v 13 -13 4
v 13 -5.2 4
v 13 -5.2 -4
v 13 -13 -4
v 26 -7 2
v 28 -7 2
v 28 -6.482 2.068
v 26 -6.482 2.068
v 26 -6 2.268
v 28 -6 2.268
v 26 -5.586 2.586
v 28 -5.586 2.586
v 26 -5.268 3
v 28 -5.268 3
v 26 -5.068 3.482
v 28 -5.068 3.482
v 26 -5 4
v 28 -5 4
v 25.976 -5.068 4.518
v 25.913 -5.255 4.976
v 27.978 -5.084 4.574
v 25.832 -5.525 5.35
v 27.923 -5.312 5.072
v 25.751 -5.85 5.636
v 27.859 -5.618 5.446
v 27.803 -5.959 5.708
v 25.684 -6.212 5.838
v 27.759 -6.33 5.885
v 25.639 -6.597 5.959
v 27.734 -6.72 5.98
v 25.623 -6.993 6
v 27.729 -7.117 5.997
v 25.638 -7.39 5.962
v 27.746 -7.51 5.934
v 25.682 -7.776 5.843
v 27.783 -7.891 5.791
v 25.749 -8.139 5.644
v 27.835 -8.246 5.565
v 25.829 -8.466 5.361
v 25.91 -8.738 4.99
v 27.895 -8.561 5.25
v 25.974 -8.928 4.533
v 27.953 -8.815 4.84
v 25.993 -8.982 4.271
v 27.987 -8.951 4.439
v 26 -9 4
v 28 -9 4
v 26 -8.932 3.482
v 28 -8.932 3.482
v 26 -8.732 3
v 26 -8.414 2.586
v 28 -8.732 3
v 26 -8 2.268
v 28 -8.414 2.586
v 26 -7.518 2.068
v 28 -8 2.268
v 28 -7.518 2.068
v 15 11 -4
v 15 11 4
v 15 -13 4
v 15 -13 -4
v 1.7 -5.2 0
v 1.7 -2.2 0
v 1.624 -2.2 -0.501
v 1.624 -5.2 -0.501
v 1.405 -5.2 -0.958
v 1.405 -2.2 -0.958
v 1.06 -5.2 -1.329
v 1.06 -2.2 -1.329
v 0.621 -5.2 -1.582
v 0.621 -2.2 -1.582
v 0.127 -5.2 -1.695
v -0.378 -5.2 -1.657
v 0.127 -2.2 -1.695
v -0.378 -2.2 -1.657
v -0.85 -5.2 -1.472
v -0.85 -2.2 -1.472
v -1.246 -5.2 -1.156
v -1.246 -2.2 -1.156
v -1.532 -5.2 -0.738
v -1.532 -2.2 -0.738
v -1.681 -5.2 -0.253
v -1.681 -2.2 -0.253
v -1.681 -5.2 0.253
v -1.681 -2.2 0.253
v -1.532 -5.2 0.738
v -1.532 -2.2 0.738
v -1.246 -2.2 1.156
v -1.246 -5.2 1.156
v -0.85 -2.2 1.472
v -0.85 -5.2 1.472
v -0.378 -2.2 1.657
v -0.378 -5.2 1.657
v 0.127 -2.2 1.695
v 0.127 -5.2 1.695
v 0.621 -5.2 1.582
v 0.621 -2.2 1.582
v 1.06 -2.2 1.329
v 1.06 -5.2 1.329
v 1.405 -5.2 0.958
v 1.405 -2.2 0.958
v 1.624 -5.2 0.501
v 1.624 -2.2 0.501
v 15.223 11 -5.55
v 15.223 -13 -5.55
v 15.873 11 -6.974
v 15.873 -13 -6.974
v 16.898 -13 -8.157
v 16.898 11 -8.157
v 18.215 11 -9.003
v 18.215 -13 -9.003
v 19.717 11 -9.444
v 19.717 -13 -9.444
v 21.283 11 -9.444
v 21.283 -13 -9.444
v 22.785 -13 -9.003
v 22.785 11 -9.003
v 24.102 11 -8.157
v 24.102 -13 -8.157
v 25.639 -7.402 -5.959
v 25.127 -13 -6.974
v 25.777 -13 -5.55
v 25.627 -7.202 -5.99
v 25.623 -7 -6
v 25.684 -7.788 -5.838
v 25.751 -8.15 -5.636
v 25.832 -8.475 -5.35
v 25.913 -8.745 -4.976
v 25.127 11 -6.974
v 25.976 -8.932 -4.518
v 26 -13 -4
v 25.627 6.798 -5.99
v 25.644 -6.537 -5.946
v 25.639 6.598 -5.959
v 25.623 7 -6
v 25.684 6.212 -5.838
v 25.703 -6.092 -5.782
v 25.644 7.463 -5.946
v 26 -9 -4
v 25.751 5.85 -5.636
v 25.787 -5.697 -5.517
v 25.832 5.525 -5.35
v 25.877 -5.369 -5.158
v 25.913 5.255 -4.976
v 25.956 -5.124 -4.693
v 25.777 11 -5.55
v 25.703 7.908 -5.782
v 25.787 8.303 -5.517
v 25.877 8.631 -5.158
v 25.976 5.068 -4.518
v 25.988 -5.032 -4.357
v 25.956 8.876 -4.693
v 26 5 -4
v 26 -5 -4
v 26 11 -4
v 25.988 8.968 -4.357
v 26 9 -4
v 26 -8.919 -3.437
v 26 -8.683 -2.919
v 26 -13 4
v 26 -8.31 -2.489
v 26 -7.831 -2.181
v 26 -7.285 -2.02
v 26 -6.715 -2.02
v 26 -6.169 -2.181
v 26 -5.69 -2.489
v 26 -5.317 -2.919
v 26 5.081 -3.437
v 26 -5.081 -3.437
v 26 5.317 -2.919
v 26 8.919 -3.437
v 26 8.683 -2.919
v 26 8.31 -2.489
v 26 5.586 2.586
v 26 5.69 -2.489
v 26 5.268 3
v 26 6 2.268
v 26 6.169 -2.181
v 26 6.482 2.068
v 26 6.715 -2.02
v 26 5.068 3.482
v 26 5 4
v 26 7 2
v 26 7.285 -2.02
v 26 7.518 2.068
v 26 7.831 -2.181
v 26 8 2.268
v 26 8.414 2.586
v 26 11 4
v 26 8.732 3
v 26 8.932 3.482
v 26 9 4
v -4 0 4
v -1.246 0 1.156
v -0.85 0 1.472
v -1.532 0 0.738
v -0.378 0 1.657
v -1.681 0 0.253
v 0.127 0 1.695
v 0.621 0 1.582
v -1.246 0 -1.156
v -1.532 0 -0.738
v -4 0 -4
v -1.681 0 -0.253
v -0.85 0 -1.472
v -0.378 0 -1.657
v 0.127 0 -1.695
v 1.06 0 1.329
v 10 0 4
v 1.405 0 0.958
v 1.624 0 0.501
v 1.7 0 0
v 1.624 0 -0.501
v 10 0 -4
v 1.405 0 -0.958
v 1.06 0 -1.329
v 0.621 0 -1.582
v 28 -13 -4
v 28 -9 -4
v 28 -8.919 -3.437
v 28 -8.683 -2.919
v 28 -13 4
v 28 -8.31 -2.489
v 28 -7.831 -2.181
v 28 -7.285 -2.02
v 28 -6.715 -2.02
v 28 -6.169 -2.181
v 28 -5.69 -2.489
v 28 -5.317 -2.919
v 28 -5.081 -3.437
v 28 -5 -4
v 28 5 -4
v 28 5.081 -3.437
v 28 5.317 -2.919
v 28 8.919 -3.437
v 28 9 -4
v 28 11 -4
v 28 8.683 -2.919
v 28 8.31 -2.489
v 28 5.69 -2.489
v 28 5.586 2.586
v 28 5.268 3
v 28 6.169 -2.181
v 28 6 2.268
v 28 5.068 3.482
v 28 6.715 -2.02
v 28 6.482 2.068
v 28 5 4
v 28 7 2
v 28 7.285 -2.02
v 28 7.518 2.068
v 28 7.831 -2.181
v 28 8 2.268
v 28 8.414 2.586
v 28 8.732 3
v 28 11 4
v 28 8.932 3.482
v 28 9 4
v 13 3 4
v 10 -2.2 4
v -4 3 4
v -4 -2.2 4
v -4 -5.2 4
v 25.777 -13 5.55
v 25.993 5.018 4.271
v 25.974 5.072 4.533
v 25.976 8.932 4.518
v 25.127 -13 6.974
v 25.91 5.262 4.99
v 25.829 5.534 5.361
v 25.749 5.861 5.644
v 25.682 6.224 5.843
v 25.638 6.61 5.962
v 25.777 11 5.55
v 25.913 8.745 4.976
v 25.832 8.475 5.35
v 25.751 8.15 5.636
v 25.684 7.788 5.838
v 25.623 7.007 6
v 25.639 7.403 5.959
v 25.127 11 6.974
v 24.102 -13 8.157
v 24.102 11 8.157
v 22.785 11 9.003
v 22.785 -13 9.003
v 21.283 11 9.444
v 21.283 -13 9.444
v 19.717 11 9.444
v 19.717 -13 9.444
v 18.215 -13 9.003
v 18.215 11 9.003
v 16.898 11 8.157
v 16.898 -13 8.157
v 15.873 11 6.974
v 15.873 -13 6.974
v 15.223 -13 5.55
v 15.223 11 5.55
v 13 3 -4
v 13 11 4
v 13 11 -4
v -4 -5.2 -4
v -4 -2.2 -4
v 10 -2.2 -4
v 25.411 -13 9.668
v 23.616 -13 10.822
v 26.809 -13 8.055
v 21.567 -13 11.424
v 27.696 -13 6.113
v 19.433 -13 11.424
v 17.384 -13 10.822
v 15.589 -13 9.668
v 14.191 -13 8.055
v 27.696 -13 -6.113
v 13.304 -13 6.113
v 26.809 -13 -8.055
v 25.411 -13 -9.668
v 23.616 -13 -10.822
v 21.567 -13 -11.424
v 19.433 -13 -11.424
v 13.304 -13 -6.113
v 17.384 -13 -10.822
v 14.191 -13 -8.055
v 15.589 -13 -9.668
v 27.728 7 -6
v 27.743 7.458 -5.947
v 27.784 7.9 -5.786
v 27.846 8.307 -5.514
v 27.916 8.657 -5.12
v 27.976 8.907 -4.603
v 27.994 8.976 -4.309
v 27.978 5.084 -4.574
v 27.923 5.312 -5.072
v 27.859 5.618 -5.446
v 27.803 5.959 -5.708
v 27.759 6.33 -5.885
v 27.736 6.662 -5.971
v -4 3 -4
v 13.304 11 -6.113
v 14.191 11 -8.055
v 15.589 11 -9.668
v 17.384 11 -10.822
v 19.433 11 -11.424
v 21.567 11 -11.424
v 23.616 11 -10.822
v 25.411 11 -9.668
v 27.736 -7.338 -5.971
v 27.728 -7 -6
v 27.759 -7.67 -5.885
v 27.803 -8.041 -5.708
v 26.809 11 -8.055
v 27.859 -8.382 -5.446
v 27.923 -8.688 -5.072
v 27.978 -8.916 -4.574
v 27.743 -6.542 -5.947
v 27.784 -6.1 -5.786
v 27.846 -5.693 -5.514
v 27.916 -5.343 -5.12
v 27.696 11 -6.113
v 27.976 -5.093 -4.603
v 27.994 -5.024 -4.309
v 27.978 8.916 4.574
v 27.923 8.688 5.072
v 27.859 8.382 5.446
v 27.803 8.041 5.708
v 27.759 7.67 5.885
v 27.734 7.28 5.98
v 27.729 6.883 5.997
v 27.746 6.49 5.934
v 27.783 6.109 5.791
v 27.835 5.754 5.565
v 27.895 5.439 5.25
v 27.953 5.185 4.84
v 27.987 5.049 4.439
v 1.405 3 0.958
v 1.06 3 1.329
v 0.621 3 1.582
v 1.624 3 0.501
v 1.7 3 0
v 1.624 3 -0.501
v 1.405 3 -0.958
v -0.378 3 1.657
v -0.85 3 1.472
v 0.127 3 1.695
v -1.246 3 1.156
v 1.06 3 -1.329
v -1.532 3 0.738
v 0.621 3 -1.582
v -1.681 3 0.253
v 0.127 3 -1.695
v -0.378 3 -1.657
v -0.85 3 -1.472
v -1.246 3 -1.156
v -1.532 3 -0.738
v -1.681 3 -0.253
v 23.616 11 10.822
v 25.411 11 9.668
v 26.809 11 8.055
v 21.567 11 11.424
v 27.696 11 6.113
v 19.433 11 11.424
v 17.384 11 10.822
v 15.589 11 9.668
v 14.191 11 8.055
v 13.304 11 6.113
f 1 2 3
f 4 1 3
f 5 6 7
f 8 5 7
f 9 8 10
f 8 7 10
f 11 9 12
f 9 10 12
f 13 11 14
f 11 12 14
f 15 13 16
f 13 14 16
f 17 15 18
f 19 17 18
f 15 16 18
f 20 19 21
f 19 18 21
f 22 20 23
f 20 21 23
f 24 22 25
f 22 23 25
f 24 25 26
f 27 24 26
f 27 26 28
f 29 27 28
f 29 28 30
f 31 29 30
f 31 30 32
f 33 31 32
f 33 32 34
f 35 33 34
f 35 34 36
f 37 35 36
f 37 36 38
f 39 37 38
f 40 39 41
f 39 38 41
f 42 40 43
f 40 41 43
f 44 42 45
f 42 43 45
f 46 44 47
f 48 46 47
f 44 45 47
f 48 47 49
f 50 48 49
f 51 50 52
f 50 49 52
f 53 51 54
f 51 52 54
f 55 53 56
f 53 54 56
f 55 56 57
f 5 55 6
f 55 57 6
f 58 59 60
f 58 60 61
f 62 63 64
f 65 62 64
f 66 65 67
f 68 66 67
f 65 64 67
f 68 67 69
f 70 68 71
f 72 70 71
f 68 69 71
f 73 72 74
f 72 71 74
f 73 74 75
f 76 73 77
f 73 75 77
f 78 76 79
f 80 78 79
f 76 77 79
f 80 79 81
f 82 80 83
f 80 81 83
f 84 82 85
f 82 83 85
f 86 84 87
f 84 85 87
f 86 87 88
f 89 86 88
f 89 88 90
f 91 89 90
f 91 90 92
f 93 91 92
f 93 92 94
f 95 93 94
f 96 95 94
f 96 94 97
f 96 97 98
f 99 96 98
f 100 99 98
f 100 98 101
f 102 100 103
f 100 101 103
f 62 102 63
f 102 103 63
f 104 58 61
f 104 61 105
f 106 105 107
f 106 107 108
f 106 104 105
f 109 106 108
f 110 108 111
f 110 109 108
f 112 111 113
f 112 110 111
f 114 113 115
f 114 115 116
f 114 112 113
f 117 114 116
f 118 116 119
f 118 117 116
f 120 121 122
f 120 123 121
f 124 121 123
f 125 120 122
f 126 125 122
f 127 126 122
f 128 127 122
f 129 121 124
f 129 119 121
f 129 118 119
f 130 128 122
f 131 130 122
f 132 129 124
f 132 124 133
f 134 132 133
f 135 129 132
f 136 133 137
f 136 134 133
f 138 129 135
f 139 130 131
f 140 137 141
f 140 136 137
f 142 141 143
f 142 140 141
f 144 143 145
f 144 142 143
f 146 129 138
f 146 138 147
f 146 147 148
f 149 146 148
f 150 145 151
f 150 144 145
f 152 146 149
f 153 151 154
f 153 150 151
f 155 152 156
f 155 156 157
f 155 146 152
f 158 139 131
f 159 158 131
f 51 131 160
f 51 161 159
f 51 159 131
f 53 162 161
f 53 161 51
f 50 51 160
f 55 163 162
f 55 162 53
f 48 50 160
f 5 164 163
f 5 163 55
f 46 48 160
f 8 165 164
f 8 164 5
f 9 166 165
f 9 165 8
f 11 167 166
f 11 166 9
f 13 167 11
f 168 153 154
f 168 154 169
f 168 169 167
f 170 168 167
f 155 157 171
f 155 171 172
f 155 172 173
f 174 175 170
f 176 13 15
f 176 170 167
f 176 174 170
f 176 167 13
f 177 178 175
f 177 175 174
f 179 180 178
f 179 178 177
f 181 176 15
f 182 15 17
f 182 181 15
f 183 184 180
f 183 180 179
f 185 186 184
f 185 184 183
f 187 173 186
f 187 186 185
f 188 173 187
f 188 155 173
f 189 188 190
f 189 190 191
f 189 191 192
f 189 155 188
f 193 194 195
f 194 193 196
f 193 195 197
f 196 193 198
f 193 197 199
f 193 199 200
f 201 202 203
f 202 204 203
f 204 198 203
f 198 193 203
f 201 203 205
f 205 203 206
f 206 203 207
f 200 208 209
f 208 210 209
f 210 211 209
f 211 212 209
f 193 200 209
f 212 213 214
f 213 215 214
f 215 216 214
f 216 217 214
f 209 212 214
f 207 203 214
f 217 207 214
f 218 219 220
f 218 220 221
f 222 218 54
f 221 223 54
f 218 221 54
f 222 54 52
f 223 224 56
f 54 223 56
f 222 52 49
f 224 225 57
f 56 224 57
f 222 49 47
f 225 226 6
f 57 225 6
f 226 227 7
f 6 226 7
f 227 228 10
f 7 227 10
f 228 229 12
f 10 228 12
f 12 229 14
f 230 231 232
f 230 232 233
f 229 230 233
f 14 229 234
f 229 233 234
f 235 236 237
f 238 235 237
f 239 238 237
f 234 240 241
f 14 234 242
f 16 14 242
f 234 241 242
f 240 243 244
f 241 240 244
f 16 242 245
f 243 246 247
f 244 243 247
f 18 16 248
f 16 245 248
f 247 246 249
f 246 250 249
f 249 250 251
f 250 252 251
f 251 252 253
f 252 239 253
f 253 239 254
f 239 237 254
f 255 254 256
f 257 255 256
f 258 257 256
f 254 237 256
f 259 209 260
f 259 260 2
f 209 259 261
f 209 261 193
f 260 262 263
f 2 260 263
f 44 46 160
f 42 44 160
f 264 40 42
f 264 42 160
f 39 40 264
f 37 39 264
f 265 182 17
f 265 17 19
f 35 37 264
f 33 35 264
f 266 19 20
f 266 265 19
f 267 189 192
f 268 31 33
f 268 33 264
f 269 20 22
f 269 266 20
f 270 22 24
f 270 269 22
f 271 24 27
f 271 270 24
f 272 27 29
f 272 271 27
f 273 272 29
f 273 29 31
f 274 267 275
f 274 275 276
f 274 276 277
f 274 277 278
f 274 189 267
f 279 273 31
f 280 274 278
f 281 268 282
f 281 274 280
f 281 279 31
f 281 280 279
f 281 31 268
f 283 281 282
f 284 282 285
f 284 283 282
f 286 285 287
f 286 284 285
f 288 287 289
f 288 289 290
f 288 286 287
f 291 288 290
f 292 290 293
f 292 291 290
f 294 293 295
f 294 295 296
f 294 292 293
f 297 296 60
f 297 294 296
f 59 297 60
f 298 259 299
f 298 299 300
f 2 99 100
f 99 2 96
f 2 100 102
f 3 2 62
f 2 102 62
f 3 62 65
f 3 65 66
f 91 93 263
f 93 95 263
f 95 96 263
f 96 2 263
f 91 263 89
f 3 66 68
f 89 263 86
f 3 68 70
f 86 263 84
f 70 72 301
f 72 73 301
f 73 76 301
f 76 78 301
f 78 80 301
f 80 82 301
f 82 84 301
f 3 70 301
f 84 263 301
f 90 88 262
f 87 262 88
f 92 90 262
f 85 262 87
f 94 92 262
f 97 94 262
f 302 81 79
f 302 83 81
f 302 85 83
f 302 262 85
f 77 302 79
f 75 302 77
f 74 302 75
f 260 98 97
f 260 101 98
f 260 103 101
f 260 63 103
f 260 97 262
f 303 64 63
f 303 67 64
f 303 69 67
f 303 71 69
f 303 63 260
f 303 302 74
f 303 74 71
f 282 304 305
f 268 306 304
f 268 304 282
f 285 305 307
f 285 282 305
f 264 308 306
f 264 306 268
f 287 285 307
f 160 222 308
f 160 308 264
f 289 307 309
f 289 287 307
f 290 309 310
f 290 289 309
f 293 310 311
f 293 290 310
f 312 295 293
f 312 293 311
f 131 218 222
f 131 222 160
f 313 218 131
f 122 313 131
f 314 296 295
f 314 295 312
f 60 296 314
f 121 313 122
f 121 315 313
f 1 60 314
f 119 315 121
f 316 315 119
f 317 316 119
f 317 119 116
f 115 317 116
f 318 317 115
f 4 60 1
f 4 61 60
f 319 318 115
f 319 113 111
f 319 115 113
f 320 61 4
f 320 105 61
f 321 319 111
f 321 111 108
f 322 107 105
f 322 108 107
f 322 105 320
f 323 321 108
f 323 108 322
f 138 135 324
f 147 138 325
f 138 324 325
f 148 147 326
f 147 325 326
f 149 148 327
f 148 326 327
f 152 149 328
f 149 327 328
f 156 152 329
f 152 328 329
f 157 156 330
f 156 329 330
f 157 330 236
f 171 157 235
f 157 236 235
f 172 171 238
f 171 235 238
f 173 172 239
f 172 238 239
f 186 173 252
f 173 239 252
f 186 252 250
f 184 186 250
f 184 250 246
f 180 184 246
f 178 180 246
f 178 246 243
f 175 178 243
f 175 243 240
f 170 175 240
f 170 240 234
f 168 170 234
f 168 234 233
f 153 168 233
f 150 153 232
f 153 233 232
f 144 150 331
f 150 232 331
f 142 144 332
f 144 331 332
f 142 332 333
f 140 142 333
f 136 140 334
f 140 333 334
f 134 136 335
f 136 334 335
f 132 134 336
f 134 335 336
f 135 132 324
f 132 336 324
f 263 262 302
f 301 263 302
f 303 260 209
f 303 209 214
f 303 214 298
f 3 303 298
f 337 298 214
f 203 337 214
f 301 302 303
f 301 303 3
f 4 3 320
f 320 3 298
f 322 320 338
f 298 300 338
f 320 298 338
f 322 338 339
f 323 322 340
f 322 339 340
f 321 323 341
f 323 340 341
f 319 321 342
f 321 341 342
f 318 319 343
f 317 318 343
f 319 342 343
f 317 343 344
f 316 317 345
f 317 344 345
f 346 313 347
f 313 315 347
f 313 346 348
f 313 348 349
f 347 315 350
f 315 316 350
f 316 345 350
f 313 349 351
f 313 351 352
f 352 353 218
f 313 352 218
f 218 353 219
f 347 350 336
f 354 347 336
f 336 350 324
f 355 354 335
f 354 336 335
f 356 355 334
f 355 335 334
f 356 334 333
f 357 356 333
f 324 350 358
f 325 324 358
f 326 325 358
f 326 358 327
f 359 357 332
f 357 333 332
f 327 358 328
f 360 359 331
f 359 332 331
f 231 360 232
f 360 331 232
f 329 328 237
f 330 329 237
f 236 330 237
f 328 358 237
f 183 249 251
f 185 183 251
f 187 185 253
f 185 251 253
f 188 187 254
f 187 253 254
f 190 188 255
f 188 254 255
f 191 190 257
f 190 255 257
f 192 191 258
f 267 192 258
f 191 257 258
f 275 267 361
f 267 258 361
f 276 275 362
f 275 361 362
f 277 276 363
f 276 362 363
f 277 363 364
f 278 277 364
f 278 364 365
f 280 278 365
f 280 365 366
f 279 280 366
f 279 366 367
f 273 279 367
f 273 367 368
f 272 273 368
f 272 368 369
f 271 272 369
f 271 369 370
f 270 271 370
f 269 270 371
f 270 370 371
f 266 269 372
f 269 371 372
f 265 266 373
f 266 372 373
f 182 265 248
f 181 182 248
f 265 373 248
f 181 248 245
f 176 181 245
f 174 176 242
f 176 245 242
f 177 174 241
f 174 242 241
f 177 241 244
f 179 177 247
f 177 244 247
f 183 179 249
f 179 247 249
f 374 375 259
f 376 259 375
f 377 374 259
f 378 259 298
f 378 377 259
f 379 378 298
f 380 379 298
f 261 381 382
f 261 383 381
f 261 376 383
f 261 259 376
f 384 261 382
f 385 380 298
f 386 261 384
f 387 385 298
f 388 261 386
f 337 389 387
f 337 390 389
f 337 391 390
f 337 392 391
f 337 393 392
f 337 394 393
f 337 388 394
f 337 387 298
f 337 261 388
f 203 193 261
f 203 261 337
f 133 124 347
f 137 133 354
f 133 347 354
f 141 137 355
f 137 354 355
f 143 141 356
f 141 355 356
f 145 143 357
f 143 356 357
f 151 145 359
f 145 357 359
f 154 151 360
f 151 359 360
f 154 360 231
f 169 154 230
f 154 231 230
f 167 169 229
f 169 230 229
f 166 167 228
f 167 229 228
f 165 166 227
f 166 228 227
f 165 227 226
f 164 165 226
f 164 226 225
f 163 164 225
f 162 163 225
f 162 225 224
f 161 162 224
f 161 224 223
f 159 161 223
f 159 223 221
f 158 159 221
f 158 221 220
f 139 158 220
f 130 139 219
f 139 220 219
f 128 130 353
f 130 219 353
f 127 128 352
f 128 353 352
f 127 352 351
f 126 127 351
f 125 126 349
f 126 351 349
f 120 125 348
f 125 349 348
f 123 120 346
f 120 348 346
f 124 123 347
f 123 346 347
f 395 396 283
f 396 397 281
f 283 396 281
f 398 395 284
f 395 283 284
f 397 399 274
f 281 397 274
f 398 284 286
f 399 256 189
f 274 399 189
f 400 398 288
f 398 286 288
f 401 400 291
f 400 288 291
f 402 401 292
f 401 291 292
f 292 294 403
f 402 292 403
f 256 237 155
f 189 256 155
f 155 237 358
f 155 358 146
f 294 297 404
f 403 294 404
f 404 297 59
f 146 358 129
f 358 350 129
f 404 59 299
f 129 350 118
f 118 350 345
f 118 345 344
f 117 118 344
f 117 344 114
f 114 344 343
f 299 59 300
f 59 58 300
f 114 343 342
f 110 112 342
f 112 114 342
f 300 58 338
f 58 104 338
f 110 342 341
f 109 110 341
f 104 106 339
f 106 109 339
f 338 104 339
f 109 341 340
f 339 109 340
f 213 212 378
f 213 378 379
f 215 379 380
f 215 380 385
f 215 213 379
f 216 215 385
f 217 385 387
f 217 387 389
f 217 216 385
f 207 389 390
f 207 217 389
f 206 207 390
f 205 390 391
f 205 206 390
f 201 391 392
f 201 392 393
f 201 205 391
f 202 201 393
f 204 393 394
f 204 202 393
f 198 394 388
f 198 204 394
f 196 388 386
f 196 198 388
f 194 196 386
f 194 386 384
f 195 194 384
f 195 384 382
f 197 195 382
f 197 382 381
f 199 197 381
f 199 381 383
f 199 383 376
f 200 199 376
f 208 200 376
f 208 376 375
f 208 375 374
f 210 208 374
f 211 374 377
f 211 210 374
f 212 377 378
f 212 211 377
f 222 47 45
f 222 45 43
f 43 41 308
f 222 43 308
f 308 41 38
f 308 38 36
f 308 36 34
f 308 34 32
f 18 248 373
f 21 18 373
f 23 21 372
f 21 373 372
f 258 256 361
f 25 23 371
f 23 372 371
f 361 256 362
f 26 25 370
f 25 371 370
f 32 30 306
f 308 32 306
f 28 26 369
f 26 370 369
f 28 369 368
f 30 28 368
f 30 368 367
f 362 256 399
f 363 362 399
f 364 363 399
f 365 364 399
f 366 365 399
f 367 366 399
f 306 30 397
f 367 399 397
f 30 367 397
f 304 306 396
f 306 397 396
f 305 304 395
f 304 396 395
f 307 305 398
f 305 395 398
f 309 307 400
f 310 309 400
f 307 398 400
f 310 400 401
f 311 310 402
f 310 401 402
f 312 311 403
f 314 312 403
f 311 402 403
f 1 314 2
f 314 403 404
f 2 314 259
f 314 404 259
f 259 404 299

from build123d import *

# Parameters (mm, degrees)
SKETCH1_W                = 6
SKETCH1_H                = 8
SKETCH1_W_2              = 8
SKETCH1_R                = 1.7
BOSS_EXTRUDE1_DEPTH      = 3
SKETCH2_W                = 8
SKETCH2_H                = 4.1
BOSS_EXTRUDE2_DEPTH      = 3
BOSS_EXTRUDE3_DEPTH      = 8
BOSS_EXTRUDE3_DEPTH_BACK = 16
SKETCH4_R                = 2
CUT_EXTRUDE1_DEPTH       = 8


with BuildPart() as part:
    # Sketch1 → Boss-Extrude1 (new body)
    with BuildSketch(Plane(origin=(0, 0, 0), x_dir=(1, 0, 0), z_dir=(0, 1, 0))):
        with Locations((7, 0)):
            Rectangle(SKETCH1_W, SKETCH1_H)
        Rectangle(SKETCH1_W_2, SKETCH1_H)
        Circle(SKETCH1_R, mode=Mode.SUBTRACT)
    extrude(amount=BOSS_EXTRUDE1_DEPTH)

    # Sketch2 → Boss-Extrude2 (add)
    with BuildSketch(Plane(origin=(10, 0, 0), x_dir=(0, 0, -1), z_dir=(1, 0, 0))):
        with Locations((0, 0.95)):
            Rectangle(SKETCH2_W, SKETCH2_H)
    extrude(amount=BOSS_EXTRUDE2_DEPTH)

    # Mirror1: part across plane


with BuildPart() as part_1:
    add(part.part)
    add(part.part.mirror(Plane(origin=(13, -1.1, 4), x_dir=(0, 0, 1), z_dir=(0, 1, 0))))

    # Sketch3 → Boss-Extrude3 (add, two sides)
    with BuildSketch(Plane(origin=(0, 3, 0), x_dir=(1, 0, 0), z_dir=(0, 1, 0))) as boss_extrude3_sk:
        with BuildLine():
            Line((28, 4), (28, -4))
            ThreePointArc((28, -4), (20.5, -11.5), (13, -4))
            Line((13, -4), (13, 4))
            ThreePointArc((13, 4), (20.5, 11.5), (28, 4))
        make_face()
        with BuildLine():
            Line((26, 4), (26, -4))
            ThreePointArc((26, -4), (20.5, -9.5), (15, -4))
            Line((15, -4), (15, 4))
            ThreePointArc((15, 4), (20.5, 9.5), (26, 4))
        make_face(mode=Mode.SUBTRACT)
    extrude(amount=BOSS_EXTRUDE3_DEPTH)
    extrude(boss_extrude3_sk.sketch, amount=-BOSS_EXTRUDE3_DEPTH_BACK)

    # Sketch4 → Cut-Extrude1 (cut)
    with BuildSketch(Plane(origin=(28, 0, 0), x_dir=(0, 0, -1), z_dir=(1, 0, 0))):
        with Locations((-4, 7)):
            Circle(SKETCH4_R)
        with Locations((4, 7)):
            Circle(SKETCH4_R)
        with Locations((4, -7)):
            Circle(SKETCH4_R)
        with Locations((-4, -7)):
            Circle(SKETCH4_R)
    extrude(amount=-CUT_EXTRUDE1_DEPTH, mode=Mode.SUBTRACT)


solid = part_1.part
